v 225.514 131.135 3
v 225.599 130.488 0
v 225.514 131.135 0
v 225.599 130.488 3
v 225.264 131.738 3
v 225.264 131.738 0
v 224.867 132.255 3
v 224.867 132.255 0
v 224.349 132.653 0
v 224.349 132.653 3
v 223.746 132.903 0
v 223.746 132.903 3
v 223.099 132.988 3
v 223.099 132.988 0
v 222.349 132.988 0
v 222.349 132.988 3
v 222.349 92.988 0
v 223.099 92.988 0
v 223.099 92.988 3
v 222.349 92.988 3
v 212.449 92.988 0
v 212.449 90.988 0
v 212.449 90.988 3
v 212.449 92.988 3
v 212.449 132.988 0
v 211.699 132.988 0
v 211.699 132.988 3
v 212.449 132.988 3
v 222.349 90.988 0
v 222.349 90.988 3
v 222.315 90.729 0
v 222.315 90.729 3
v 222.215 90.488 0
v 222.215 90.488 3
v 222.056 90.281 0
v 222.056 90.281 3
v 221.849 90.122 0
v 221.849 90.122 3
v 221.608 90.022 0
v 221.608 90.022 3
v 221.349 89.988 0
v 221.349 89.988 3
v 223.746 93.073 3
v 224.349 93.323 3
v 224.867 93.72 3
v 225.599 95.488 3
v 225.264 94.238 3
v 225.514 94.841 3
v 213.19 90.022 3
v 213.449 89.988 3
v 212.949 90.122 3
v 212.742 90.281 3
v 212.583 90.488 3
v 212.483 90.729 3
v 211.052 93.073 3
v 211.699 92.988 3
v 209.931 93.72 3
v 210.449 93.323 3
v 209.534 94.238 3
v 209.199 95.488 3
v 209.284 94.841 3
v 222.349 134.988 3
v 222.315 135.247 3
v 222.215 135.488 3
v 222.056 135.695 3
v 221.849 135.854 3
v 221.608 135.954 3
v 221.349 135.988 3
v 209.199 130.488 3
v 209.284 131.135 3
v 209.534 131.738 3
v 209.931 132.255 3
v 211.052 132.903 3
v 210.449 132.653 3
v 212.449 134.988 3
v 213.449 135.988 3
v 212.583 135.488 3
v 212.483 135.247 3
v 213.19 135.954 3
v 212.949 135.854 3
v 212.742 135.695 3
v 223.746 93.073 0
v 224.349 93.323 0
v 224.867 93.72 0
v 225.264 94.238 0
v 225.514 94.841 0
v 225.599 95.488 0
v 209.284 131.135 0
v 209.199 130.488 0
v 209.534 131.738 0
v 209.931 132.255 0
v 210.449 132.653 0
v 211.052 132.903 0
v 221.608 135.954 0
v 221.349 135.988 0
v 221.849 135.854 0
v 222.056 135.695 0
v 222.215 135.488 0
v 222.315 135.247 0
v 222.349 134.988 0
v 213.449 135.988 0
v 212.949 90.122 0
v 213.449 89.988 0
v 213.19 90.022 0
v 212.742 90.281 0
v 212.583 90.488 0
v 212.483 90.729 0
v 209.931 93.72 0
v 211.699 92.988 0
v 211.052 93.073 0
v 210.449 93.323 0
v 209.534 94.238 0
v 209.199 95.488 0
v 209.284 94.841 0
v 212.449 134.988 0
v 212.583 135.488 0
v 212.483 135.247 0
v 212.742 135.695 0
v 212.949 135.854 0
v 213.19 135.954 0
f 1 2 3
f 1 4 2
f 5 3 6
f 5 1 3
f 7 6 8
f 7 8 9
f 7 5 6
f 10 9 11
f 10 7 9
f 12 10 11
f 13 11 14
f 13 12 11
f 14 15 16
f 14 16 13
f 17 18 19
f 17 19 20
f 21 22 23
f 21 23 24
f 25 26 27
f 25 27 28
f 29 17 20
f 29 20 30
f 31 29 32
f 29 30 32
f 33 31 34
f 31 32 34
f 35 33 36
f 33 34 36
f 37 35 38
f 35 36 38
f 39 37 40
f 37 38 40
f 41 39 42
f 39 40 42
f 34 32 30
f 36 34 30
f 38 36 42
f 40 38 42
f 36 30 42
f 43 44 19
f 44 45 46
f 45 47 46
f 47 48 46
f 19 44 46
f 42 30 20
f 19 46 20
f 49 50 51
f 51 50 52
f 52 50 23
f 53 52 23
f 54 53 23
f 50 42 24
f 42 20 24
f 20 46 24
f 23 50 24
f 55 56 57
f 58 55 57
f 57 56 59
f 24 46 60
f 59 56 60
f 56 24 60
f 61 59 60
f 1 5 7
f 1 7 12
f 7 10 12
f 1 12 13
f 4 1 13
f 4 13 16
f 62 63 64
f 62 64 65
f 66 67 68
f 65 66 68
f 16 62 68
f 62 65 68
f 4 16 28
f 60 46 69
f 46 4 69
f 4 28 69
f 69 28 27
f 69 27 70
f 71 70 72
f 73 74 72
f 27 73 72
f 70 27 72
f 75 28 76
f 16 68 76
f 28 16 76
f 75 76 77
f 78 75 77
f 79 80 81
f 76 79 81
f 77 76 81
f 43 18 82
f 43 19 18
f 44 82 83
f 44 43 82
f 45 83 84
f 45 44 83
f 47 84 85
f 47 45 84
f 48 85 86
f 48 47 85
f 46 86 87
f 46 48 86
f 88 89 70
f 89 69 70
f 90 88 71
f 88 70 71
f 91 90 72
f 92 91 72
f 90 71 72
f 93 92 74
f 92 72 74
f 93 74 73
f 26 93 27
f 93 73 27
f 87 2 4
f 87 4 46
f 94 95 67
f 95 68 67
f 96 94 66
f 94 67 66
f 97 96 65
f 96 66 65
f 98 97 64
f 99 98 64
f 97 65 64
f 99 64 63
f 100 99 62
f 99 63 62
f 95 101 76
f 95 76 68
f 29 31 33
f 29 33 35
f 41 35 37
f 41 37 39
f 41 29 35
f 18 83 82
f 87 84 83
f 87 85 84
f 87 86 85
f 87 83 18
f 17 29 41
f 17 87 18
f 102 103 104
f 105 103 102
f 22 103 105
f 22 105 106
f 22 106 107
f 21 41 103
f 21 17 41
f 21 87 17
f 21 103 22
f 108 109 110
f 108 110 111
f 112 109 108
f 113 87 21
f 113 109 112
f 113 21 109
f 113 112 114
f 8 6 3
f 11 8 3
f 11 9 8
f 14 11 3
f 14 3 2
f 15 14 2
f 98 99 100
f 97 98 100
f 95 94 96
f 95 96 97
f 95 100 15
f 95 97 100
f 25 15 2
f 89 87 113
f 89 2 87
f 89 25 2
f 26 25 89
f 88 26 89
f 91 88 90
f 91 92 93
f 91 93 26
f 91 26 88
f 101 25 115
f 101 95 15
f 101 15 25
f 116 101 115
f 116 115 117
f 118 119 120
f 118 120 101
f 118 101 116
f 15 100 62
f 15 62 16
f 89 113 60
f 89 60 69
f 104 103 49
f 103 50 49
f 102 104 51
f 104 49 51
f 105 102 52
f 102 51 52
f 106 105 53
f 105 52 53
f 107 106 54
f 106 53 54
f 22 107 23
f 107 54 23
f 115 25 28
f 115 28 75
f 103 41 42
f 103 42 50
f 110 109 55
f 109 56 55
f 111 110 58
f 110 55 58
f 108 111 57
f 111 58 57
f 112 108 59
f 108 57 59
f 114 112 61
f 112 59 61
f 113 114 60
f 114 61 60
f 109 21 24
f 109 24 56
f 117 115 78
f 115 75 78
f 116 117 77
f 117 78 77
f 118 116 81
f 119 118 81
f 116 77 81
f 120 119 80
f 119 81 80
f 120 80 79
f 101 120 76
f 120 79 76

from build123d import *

# Parameters (mm, degrees)
PAD_DEPTH   = 3
FILLET_R    = 1
FILLET001_R = 2.5


with BuildPart() as part:
    # Sketch → Pad (new body)
    with BuildSketch(Plane.XY):
        Polygon((25.598985, 32.987703), (25.598985, -7.012297), (22.348985, -7.012297), (22.348985, -10.012297), (12.448985, -10.012297), (12.448985, -7.012297), (9.198985, -7.012297), (9.198985, 32.987701), (12.448985, 32.987701), (12.448985, 35.987703), (22.348985, 35.987703), (22.348985, 32.987703), align=None)
    extrude(amount=PAD_DEPTH)

    # Fillet
    fillet_edges = [part.edges().sort_by_distance(p)[0] for p in [
        (22.348985, -10.012297, 1.5),
        (12.448985, -10.012297, 1.5),
        (22.348985, 35.987703, 1.5),
        (12.448985, 35.987703, 1.5),
    ]]
    fillet(fillet_edges, radius=FILLET_R)

    # Fillet001
    fillet001_edges = [part.edges().sort_by_distance(p)[0] for p in [
        (25.598985, -7.012297, 1.5),
        (25.598985, 32.987703, 1.5),
        (9.198985, -7.012297, 1.5),
        (9.198985, 32.987701, 1.5),
    ]]
    fillet(fillet001_edges, radius=FILLET001_R)


with BuildPart() as part_1:
    # Fillet001 placement: moved
    add(part.part.moved(Location((200, 100, 0))))


solid = part_1.part
